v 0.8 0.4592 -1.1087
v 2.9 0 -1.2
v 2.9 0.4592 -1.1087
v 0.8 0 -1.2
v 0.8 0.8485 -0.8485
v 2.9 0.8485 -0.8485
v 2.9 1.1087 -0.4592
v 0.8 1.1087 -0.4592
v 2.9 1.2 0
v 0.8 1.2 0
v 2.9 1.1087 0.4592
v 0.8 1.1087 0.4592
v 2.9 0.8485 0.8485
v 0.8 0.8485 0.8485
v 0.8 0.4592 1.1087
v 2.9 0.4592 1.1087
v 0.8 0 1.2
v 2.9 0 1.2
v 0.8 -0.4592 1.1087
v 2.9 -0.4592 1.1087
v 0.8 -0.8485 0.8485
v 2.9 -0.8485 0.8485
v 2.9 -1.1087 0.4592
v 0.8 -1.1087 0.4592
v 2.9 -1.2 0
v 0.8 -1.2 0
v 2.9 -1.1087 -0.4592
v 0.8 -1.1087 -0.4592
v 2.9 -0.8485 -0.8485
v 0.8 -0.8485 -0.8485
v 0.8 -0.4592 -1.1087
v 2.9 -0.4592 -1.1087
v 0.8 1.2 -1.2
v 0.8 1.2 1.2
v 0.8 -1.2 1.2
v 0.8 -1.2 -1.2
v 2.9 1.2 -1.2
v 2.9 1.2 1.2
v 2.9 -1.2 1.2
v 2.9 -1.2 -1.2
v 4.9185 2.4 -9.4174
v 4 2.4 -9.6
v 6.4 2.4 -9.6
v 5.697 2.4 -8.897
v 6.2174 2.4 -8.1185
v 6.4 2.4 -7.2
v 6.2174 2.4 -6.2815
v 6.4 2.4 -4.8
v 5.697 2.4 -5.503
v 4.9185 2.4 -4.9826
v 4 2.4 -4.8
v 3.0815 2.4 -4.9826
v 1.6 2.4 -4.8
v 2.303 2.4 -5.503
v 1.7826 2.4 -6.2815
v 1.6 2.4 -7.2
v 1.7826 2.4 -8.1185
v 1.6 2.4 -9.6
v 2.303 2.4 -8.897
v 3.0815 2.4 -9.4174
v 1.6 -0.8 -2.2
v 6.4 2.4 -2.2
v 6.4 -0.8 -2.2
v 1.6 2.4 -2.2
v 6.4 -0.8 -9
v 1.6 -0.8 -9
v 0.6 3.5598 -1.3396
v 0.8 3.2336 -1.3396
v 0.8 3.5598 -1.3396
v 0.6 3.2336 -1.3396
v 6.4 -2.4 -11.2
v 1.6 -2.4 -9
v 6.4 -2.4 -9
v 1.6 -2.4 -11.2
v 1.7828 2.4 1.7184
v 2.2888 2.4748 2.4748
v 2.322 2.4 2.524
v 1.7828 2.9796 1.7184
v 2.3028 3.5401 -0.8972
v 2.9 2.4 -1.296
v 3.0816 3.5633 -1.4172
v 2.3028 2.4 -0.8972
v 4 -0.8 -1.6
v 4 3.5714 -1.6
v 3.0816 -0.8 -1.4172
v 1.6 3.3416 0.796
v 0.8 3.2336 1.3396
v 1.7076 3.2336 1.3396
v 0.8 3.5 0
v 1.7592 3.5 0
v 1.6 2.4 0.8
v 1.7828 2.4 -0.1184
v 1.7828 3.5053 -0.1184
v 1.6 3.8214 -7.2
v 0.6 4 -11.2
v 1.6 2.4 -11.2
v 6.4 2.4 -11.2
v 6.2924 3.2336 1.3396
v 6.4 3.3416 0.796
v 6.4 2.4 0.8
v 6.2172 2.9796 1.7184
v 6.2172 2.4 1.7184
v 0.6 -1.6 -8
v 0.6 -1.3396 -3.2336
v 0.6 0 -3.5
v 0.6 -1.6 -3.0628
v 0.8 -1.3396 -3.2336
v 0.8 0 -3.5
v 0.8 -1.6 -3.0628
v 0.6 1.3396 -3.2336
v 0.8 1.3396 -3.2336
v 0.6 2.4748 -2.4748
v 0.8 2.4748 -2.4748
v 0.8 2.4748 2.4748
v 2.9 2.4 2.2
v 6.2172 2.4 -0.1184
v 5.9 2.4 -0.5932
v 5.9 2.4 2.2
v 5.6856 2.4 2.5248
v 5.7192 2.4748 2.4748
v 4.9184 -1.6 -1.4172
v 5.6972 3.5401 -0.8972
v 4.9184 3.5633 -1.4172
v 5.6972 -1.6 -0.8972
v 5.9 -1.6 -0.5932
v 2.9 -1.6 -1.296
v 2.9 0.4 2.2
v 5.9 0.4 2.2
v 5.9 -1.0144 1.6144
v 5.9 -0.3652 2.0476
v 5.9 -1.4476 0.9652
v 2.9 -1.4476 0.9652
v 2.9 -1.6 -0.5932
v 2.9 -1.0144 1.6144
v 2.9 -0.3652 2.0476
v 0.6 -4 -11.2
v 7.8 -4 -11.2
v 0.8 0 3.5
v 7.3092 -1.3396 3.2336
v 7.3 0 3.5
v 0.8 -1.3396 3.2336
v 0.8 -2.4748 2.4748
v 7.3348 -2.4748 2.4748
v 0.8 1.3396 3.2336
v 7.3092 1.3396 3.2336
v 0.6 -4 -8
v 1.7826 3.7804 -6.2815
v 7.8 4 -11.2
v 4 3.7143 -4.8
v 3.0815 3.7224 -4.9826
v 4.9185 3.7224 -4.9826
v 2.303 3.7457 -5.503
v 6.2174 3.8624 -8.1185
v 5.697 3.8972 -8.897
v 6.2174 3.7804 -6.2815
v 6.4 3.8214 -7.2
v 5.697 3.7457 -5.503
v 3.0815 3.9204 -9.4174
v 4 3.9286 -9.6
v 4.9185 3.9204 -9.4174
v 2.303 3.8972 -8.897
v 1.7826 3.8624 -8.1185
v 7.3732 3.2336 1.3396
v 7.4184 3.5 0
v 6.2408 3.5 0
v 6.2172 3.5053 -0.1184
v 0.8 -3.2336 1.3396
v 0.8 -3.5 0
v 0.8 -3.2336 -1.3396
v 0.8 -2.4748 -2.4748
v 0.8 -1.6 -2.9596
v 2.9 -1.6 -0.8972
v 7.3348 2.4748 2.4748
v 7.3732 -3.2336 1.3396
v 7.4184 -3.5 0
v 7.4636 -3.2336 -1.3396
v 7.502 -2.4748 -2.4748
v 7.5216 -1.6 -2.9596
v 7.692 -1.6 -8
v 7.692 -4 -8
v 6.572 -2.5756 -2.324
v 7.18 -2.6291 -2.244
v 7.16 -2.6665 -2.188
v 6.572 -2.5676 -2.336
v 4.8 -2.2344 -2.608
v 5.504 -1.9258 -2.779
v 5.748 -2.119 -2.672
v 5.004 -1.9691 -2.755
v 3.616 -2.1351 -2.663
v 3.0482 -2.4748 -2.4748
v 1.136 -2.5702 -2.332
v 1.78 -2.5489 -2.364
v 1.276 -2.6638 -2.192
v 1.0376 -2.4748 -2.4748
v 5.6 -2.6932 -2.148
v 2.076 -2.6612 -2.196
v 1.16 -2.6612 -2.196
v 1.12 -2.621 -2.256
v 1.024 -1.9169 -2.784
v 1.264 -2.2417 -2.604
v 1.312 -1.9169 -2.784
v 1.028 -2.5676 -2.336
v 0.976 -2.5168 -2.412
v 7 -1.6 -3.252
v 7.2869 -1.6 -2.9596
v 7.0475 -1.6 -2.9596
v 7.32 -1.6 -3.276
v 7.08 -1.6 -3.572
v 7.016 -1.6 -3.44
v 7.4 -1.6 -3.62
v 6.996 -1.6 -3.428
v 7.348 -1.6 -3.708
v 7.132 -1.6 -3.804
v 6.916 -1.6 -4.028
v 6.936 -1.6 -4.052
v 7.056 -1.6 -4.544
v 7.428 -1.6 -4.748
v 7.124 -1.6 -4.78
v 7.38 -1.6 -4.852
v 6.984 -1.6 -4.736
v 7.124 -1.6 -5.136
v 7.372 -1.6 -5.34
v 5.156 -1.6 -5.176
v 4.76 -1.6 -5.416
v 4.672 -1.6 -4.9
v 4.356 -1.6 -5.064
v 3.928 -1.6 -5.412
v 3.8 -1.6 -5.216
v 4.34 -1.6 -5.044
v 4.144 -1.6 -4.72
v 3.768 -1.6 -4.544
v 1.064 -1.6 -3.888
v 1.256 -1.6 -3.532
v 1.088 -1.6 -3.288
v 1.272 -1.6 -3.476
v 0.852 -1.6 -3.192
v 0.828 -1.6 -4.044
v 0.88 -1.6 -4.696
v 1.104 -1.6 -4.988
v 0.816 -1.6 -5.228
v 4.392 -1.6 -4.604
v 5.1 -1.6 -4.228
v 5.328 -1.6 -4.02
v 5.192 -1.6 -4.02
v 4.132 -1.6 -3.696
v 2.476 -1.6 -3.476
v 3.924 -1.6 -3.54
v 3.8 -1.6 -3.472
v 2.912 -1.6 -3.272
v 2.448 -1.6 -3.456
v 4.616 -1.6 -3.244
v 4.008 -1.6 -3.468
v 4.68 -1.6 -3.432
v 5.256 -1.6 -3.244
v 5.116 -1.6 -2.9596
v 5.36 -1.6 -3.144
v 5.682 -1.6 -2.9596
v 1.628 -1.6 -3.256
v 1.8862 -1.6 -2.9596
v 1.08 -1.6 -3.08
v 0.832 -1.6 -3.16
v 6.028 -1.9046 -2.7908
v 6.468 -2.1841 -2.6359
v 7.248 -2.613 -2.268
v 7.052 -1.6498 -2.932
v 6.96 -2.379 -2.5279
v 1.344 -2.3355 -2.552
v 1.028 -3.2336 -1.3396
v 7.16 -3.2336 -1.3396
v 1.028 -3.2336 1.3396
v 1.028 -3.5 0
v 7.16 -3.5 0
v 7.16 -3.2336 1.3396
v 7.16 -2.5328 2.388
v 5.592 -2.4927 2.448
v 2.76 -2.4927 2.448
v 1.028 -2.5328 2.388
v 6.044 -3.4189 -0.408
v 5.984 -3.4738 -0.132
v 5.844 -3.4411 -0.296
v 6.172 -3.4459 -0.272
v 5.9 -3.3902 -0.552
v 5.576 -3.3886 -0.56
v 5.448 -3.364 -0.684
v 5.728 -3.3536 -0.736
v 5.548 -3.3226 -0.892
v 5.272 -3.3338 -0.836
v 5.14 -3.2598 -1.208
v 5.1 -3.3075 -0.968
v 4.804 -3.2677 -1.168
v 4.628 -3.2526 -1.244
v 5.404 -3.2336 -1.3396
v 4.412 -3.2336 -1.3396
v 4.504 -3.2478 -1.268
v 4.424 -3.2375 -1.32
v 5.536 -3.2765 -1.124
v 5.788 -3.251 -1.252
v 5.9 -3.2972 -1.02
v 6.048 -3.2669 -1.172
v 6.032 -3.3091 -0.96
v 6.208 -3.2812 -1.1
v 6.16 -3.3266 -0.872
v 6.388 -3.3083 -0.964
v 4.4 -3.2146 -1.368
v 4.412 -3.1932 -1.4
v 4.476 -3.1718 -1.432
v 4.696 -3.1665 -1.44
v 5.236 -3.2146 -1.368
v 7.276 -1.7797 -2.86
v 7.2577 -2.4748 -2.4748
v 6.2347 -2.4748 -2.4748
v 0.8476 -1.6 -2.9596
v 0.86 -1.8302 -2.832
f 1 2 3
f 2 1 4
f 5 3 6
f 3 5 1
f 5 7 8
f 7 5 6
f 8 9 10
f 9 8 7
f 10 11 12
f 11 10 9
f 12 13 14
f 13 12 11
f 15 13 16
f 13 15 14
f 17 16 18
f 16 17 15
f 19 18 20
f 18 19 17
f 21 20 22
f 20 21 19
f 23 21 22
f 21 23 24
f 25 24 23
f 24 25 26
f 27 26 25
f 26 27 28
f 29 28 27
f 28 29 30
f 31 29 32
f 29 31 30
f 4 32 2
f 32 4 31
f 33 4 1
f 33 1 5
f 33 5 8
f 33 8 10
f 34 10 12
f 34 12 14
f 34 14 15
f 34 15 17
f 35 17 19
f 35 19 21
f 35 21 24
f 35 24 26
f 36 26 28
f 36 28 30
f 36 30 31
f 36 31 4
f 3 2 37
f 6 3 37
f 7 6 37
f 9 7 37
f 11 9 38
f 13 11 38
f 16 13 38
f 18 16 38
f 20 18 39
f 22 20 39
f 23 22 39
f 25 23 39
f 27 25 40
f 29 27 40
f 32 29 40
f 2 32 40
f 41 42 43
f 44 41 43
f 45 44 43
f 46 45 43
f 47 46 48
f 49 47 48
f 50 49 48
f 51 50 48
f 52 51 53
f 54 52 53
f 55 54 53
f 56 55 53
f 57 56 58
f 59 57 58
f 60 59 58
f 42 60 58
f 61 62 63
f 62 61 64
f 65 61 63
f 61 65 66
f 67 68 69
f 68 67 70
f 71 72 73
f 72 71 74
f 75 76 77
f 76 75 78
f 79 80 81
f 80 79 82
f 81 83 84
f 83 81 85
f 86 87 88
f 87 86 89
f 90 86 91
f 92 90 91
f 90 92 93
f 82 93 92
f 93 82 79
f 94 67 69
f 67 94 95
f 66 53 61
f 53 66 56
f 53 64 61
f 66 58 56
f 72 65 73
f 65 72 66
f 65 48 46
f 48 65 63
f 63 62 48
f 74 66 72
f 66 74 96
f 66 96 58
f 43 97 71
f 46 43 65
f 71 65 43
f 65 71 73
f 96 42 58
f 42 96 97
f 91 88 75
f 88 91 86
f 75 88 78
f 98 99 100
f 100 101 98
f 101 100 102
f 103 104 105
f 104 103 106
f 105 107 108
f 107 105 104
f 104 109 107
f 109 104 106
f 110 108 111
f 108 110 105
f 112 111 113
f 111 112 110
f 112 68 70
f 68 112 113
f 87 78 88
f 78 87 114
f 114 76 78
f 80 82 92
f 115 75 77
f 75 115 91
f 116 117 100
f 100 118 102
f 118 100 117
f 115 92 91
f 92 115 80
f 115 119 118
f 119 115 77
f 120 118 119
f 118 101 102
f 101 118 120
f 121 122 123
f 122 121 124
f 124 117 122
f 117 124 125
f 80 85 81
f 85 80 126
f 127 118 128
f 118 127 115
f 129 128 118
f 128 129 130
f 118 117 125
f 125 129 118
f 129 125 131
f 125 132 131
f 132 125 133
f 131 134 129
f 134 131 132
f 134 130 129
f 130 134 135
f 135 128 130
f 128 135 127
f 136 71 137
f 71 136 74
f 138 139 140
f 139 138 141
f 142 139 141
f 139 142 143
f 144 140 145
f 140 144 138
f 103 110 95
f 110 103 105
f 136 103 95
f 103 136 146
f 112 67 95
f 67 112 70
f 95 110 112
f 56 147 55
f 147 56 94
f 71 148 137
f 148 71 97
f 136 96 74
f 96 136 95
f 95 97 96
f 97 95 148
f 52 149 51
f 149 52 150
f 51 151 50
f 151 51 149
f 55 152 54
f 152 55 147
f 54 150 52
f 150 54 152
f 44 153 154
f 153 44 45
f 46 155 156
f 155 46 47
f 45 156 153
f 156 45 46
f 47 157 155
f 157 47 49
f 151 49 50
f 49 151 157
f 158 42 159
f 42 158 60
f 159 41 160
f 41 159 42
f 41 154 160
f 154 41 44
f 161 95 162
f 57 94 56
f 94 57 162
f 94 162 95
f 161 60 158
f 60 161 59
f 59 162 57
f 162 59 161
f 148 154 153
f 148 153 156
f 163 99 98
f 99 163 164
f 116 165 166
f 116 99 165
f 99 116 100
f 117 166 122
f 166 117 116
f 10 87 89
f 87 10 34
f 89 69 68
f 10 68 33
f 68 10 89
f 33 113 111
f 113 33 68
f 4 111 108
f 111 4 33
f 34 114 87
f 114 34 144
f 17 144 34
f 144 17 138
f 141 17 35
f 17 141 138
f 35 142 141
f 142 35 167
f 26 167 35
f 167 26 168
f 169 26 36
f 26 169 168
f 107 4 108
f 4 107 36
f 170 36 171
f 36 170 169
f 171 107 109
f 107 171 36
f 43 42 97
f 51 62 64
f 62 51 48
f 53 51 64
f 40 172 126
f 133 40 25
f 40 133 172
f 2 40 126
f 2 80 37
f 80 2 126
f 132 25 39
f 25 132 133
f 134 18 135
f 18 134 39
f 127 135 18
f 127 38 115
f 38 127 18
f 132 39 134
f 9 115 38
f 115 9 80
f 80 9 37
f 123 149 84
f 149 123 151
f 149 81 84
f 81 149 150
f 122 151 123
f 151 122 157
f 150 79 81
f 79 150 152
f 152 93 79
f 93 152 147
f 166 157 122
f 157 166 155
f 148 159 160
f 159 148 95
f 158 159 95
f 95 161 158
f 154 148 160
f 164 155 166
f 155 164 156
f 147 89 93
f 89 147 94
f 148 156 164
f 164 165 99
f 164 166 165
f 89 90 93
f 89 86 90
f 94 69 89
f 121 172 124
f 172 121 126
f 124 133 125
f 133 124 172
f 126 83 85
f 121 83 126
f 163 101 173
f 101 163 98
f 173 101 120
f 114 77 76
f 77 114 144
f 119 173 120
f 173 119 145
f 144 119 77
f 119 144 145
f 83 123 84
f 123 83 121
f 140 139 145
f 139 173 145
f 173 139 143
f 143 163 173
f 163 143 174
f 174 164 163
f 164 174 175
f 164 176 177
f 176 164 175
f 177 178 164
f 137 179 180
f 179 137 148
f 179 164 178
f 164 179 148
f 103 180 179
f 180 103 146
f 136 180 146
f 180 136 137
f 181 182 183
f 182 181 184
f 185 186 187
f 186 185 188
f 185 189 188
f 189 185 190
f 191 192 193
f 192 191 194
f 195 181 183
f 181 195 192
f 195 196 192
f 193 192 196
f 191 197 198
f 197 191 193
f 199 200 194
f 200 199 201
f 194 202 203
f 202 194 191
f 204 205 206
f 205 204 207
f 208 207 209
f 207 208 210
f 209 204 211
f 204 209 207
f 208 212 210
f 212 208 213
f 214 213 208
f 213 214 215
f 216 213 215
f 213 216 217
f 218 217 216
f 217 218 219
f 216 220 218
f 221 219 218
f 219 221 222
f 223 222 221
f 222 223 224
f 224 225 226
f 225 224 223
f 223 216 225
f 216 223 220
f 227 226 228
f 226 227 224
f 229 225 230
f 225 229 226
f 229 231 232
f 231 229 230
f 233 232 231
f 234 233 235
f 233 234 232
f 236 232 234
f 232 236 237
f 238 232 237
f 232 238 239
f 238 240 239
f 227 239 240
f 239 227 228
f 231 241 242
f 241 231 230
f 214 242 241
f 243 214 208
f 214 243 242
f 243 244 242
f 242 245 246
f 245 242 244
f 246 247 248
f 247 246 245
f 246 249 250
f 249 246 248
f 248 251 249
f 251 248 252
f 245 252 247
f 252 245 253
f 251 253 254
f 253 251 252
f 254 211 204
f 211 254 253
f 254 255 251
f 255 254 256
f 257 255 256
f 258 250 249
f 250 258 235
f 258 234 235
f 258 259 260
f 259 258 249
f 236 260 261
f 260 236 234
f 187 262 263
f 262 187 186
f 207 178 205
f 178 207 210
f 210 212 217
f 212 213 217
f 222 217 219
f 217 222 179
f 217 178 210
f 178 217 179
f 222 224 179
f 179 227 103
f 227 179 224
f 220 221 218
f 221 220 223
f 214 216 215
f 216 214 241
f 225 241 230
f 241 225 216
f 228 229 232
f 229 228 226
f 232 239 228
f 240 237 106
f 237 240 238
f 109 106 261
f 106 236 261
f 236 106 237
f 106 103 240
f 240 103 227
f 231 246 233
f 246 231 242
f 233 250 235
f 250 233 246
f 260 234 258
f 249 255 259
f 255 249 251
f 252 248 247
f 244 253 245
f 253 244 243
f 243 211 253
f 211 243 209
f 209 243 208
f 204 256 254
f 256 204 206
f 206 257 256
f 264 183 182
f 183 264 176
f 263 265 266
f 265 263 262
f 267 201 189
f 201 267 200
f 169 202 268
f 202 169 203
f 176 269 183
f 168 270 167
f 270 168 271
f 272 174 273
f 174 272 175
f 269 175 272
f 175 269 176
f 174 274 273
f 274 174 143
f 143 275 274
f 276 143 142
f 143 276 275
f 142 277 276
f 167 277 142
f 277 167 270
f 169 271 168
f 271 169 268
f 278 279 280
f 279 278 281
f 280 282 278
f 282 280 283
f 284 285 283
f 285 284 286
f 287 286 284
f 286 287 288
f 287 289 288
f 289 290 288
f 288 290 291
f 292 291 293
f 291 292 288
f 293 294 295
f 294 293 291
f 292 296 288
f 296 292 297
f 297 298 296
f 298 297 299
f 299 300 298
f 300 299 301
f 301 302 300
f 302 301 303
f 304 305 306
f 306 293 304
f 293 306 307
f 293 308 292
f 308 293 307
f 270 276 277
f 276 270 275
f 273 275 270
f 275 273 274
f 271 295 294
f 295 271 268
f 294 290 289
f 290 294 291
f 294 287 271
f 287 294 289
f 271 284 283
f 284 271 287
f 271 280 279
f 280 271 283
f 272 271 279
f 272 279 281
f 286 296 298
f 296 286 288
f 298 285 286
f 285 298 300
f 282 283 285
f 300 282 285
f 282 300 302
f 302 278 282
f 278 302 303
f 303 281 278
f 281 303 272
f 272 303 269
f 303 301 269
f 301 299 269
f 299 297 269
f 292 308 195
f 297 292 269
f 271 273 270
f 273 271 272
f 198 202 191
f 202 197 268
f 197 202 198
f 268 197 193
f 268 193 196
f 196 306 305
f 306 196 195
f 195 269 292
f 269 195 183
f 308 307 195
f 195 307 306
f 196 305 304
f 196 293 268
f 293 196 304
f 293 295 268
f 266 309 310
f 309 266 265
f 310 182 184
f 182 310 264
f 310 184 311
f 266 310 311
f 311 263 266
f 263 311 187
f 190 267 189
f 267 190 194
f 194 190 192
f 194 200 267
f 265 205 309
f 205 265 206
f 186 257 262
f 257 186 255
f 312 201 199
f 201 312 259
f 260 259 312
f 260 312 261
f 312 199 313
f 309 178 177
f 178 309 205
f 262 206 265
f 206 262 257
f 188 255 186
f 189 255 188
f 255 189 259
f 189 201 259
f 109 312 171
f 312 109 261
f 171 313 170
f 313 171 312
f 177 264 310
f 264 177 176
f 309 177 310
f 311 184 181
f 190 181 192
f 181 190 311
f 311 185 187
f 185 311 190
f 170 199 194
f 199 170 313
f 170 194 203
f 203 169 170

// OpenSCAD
use <../lib.scad>
use <s/3817bs01.scad>
function ldraw_lib__3817bps0() = [
// 0 ~Minifig Leg Left with SW White Leggings Pattern (Obsolete)
// 0 Name: 3817bps0.dat
// 0 Author: Magnus Forsberg [MagFors]
// 0 !LDRAW_ORG Part UPDATE 2023-03
// 0 !LICENSE Licensed under CC BY 4.0 : see CAreadme.txt
// 
// 0 BFC CERTIFY CCW
  [0,"BFC","CERTIFY"],
  [0,"BFC","CCW"],
// 
// 0 !KEYWORDS 1999, Bricklink 970c02pb03, Luke Skywalker, set 4501, set 7110
// 0 !KEYWORDS set 7190, Tatooine
// 
// 0 !CMDLINE -c19
// 
// 0 !HISTORY 2012-03-30 [TK-949] Original design as 3817ps0
// 0 !HISTORY 2020-06-24 [MagFors] Adapted to corrected geometry
// 0 !HISTORY 2020-12-29 [PTadmin] Official Update 2020-03
// 0 !HISTORY 2023-05-21 [MagFors] Obsoleted due to bad geomatery
// 0 !HISTORY 2023-06-24 [OrionP] Official Update 2023-03
// 
// 
// 1 16 0 0 0 1 0 0 0 1 0 0 0 1 s\3817bs01.dat
  [1,16,0,0,0,1,0,0,0,1,0,0,0,1, ldraw_lib__s__3817bs01()],
// 4 16 1.5 20 -4 1.5 20 -10 19.23 20 -10 19.23 20 -4
  [4,16,1.5,20,-4,1.5,20,-10,19.23,20,-10,19.23,20,-4],
// 4 16 1.5 28 -10 19.5 28 -10 19.23 20 -10 1.5 20 -10
  [4,16,1.5,28,-10,19.5,28,-10,19.23,20,-10,1.5,20,-10],
// 5 24 2 3.349 -8.084 18.659 3.349 -8.084 2 0 -8.75 2 6.187 -6.187
  [5,24,2,3.349,-8.084,18.659,3.349,-8.084,2,0,-8.75,2,6.187,-6.187],
// 5 24 2 6.187 -6.187 18.755 6.187 -6.187 2 7.399 -4 2 3.349 -8.084
  [5,24,2,6.187,-6.187,18.755,6.187,-6.187,2,7.399,-4,2,3.349,-8.084],
// 5 24 2 0 -8.75 18.546 0 -8.75 2 3.349 -8.084 2 -3.349 -8.084
  [5,24,2,0,-8.75,18.546,0,-8.75,2,3.349,-8.084,2,-3.349,-8.084],
// 5 24 2 -3.349 -8.084 18.433 -3.349 -8.084 2 0 -8.75 2 -6.187 -6.187
  [5,24,2,-3.349,-8.084,18.433,-3.349,-8.084,2,0,-8.75,2,-6.187,-6.187],
// 
// 4 0 16.43 5.81 -6.439 16.43 5.84 -6.4189 17.95 5.61 -6.5727 17.9 5.47 -6.6663
  [4,0,16.43,5.81,-6.439,16.43,5.84,-6.4189,17.95,5.61,-6.5727,17.9,5.47,-6.6663],
// 4 0 13.76 6.9476 -4.8145 14.37 6.68 -5.2974 12 6.52 -5.5861 12.51 6.8876 -4.9228
  [4,0,13.76,6.9476,-4.8145,14.37,6.68,-5.2974,12,6.52,-5.5861,12.51,6.8876,-4.9228],
// 4 0 7.6205 6.187 -6.187 9.04 6.6576 -5.3378 12.51 6.8876 -4.9228 12 6.52 -5.5861
  [4,0,7.6205,6.187,-6.187,9.04,6.6576,-5.3378,12.51,6.8876,-4.9228,12,6.52,-5.5861],
// 4 0 3.19 5.48 -6.6596 2.84 5.83 -6.4256 2.5939 6.187 -6.187 4.45 5.91 -6.3722
  [4,0,3.19,5.48,-6.6596,2.84,5.83,-6.4256,2.5939,6.187,-6.187,4.45,5.91,-6.3722],
// 4 0 16.43 5.81 -6.439 17.9 5.47 -6.6663 14 5.37 -6.7331 4.45 5.91 -6.3722
  [4,0,16.43,5.81,-6.439,17.9,5.47,-6.6663,14,5.37,-6.7331,4.45,5.91,-6.3722],
// 3 0 14 5.37 -6.7331 5.19 5.49 -6.6529 4.45 5.91 -6.3722
  [3,0,14,5.37,-6.7331,5.19,5.49,-6.6529,4.45,5.91,-6.3722],
// 3 0 3.19 5.48 -6.6596 4.45 5.91 -6.3722 5.19 5.49 -6.6529
  [3,0,3.19,5.48,-6.6596,4.45,5.91,-6.3722,5.19,5.49,-6.6529],
// 4 0 2.8 5.64 -6.5526 2.84 5.83 -6.4256 3.19 5.48 -6.6596 2.9 5.49 -6.6529
  [4,0,2.8,5.64,-6.5526,2.84,5.83,-6.4256,3.19,5.48,-6.6596,2.9,5.49,-6.6529],
// 4 0 3.28 6.96 -4.7922 3.16 6.51 -5.6042 2.5939 6.187 -6.187 2.56 6.96 -4.7922
  [4,0,3.28,6.96,-4.7922,3.16,6.51,-5.6042,2.5939,6.187,-6.187,2.56,6.96,-4.7922],
// 4 0 2.5939 6.187 -6.187 2.84 5.83 -6.4256 2.57 5.84 -6.4189 2.44 6.03 -6.2919
  [4,0,2.5939,6.187,-6.187,2.84,5.83,-6.4256,2.57,5.84,-6.4189,2.44,6.03,-6.2919],
// 4 0 18.3 8.19 -4 18.2172 7.399 -4 17.6188 7.399 -4 17.5 8.13 -4
  [4,0,18.3,8.19,-4,18.2172,7.399,-4,17.6188,7.399,-4,17.5,8.13,-4],
// 4 0 17.7 8.93 -4 18.5 9.05 -4 18.3 8.19 -4 17.54 8.6 -4
  [4,0,17.7,8.93,-4,18.5,9.05,-4,18.3,8.19,-4,17.54,8.6,-4],
// 4 0 17.49 8.57 -4 17.54 8.6 -4 18.3 8.19 -4 17.5 8.13 -4
  [4,0,17.49,8.57,-4,17.54,8.6,-4,18.3,8.19,-4,17.5,8.13,-4],
// 4 0 18.37 9.27 -4 18.5 9.05 -4 17.7 8.93 -4 17.83 9.51 -4
  [4,0,18.37,9.27,-4,18.5,9.05,-4,17.7,8.93,-4,17.83,9.51,-4],
// 4 0 17.83 9.51 -4 17.7 8.93 -4 17.29 10.07 -4 17.34 10.13 -4
  [4,0,17.83,9.51,-4,17.7,8.93,-4,17.29,10.07,-4,17.34,10.13,-4],
// 4 0 17.83 9.51 -4 17.34 10.13 -4 17.64 11.36 -4 18.57 11.87 -4
  [4,0,17.83,9.51,-4,17.34,10.13,-4,17.64,11.36,-4,18.57,11.87,-4],
// 4 0 18.45 12.13 -4 18.57 11.87 -4 17.64 11.36 -4 17.81 11.95 -4
  [4,0,18.45,12.13,-4,18.57,11.87,-4,17.64,11.36,-4,17.81,11.95,-4],
// 3 0 17.64 11.36 -4 17.46 11.84 -4 17.81 11.95 -4
  [3,0,17.64,11.36,-4,17.46,11.84,-4,17.81,11.95,-4],
// 4 0 18.45 12.13 -4 17.81 11.95 -4 17.81 12.84 -4 18.43 13.35 -4
  [4,0,18.45,12.13,-4,17.81,11.95,-4,17.81,12.84,-4,18.43,13.35,-4],
// 4 0 18.43 13.35 -4 17.81 12.84 -4 12.89 12.94 -4 11.9 13.54 -4
  [4,0,18.43,13.35,-4,17.81,12.84,-4,12.89,12.94,-4,11.9,13.54,-4],
// 4 0 11.9 13.54 -4 12.89 12.94 -4 11.68 12.25 -4 10.89 12.66 -4
  [4,0,11.9,13.54,-4,12.89,12.94,-4,11.68,12.25,-4,10.89,12.66,-4],
// 4 0 11.68 12.25 -4 12.89 12.94 -4 17.46 11.84 -4 17.64 11.36 -4
  [4,0,11.68,12.25,-4,12.89,12.94,-4,17.46,11.84,-4,17.64,11.36,-4],
// 4 0 9.82 13.53 -4 11.9 13.54 -4 10.89 12.66 -4 9.5 13.04 -4
  [4,0,9.82,13.53,-4,11.9,13.54,-4,10.89,12.66,-4,9.5,13.04,-4],
// 4 0 10.85 12.61 -4 10.89 12.66 -4 11.68 12.25 -4 10.36 11.8 -4
  [4,0,10.85,12.61,-4,10.89,12.66,-4,11.68,12.25,-4,10.36,11.8,-4],
// 4 0 10.85 12.61 -4 10.36 11.8 -4 9.42 11.36 -4 2.66 9.72 -4
  [4,0,10.85,12.61,-4,10.36,11.8,-4,9.42,11.36,-4,2.66,9.72,-4],
// 3 0 3.14 8.83 -4 2.66 9.72 -4 9.42 11.36 -4
  [3,0,3.14,8.83,-4,2.66,9.72,-4,9.42,11.36,-4],
// 4 0 3.14 8.83 -4 3.18 8.69 -4 2.72 8.22 -4 2.66 9.72 -4
  [4,0,3.14,8.83,-4,3.18,8.69,-4,2.72,8.22,-4,2.66,9.72,-4],
// 4 0 2.66 9.72 -4 2.72 8.22 -4 2.13 7.98 -4 2.07 10.11 -4
  [4,0,2.66,9.72,-4,2.72,8.22,-4,2.13,7.98,-4,2.07,10.11,-4],
// 4 0 2.76 12.47 -4 2.66 9.72 -4 2.07 10.11 -4 2.2 11.74 -4
  [4,0,2.76,12.47,-4,2.66,9.72,-4,2.07,10.11,-4,2.2,11.74,-4],
// 3 0 2.2 11.74 -4 2.04 13.07 -4 2.76 12.47 -4
  [3,0,2.2,11.74,-4,2.04,13.07,-4,2.76,12.47,-4],
// 4 0 2.76 12.47 -4 2.04 13.07 -4 9.82 13.53 -4 9.5 13.04 -4
  [4,0,2.76,12.47,-4,2.04,13.07,-4,9.82,13.53,-4,9.5,13.04,-4],
// 4 0 9.42 11.36 -4 10.36 11.8 -4 10.98 11.51 -4 12.75 10.57 -4
  [4,0,9.42,11.36,-4,10.36,11.8,-4,10.98,11.51,-4,12.75,10.57,-4],
// 3 0 17.29 10.07 -4 12.75 10.57 -4 10.98 11.51 -4
  [3,0,17.29,10.07,-4,12.75,10.57,-4,10.98,11.51,-4],
// 4 0 17.29 10.07 -4 17.7 8.93 -4 13.32 10.05 -4 12.75 10.57 -4
  [4,0,17.29,10.07,-4,17.7,8.93,-4,13.32,10.05,-4,12.75,10.57,-4],
// 3 0 13.32 10.05 -4 12.98 10.05 -4 12.75 10.57 -4
  [3,0,13.32,10.05,-4,12.98,10.05,-4,12.75,10.57,-4],
// 4 0 12.75 10.57 -4 12.98 10.05 -4 10.33 9.24 -4 6.19 8.69 -4
  [4,0,12.75,10.57,-4,12.98,10.05,-4,10.33,9.24,-4,6.19,8.69,-4],
// 4 0 6.19 8.69 -4 10.33 9.24 -4 9.81 8.85 -4 9.5 8.68 -4
  [4,0,6.19,8.69,-4,10.33,9.24,-4,9.81,8.85,-4,9.5,8.68,-4],
// 4 0 6.19 8.69 -4 9.5 8.68 -4 7.28 8.18 -4 6.12 8.64 -4
  [4,0,6.19,8.69,-4,9.5,8.68,-4,7.28,8.18,-4,6.12,8.64,-4],
// 4 0 7.28 8.18 -4 9.5 8.68 -4 10.02 8.67 -4 11.54 8.11 -4
  [4,0,7.28,8.18,-4,9.5,8.68,-4,10.02,8.67,-4,11.54,8.11,-4],
// 4 0 10.02 8.67 -4 9.81 8.85 -4 10.33 9.24 -4 11.7 8.58 -4
  [4,0,10.02,8.67,-4,9.81,8.85,-4,10.33,9.24,-4,11.7,8.58,-4],
// 4 0 11.54 8.11 -4 10.02 8.67 -4 11.7 8.58 -4 13.14 8.11 -4
  [4,0,11.54,8.11,-4,10.02,8.67,-4,11.7,8.58,-4,13.14,8.11,-4],
// 4 0 13.14 8.11 -4 11.7 8.58 -4 17.49 8.57 -4 17.5 8.13 -4
  [4,0,13.14,8.11,-4,11.7,8.58,-4,17.49,8.57,-4,17.5,8.13,-4],
// 4 0 11.54 8.11 -4 13.14 8.11 -4 13.4 7.86 -4 12.7901 7.399 -4
  [4,0,11.54,8.11,-4,13.14,8.11,-4,13.4,7.86,-4,12.7901,7.399,-4],
// 3 0 14.2051 7.399 -4 12.7901 7.399 -4 13.4 7.86 -4
  [3,0,14.2051,7.399,-4,12.7901,7.399,-4,13.4,7.86,-4],
// 4 0 3.18 8.69 -4 6.12 8.64 -4 7.28 8.18 -4 4.07 8.14 -4
  [4,0,3.18,8.69,-4,6.12,8.64,-4,7.28,8.18,-4,4.07,8.14,-4],
// 3 0 4.07 8.14 -4 2.72 8.22 -4 3.18 8.69 -4
  [3,0,4.07,8.14,-4,2.72,8.22,-4,3.18,8.69,-4],
// 4 0 4.07 8.14 -4 7.28 8.18 -4 4.7156 7.399 -4 2.7 7.7 -4
  [4,0,4.07,8.14,-4,7.28,8.18,-4,4.7156,7.399,-4,2.7,7.7,-4],
// 4 0 2.7 7.7 -4 2.08 7.9 -4 2.13 7.98 -4 2.72 8.22 -4
  [4,0,2.7,7.7,-4,2.08,7.9,-4,2.13,7.98,-4,2.72,8.22,-4],
// 4 0 14.37 6.68 -5.2974 13.76 6.9476 -4.8145 15.07 6.977 -4.7615 16.17 6.5897 -5.4603
  [4,0,14.37,6.68,-5.2974,13.76,6.9476,-4.8145,15.07,6.977,-4.7615,16.17,6.5897,-5.4603],
// 4 16 18.804 7.399 -4 18.2172 7.399 -4 18.3 8.19 -4 18.5 9.05 -4
  [4,16,18.804,7.399,-4,18.2172,7.399,-4,18.3,8.19,-4,18.5,9.05,-4],
// 3 16 18.5 9.05 -4 18.37 9.27 -4 18.57 11.87 -4
  [3,16,18.5,9.05,-4,18.37,9.27,-4,18.57,11.87,-4],
// 3 16 18.37 9.27 -4 17.83 9.51 -4 18.57 11.87 -4
  [3,16,18.37,9.27,-4,17.83,9.51,-4,18.57,11.87,-4],
// 4 16 18.57 11.87 -4 18.45 12.13 -4 18.43 13.35 -4 19.23 20 -4
  [4,16,18.57,11.87,-4,18.45,12.13,-4,18.43,13.35,-4,19.23,20,-4],
// 4 16 18.804 7.399 -4 18.5 9.05 -4 18.57 11.87 -4 19.23 20 -4
  [4,16,18.804,7.399,-4,18.5,9.05,-4,18.57,11.87,-4,19.23,20,-4],
// 3 16 18.43 13.35 -4 11.9 13.54 -4 19.23 20 -4
  [3,16,18.43,13.35,-4,11.9,13.54,-4,19.23,20,-4],
// 4 16 19.23 20 -4 11.9 13.54 -4 9.82 13.53 -4 1.5 20 -4
  [4,16,19.23,20,-4,11.9,13.54,-4,9.82,13.53,-4,1.5,20,-4],
// 4 16 17.81 12.84 -4 17.81 11.95 -4 17.46 11.84 -4 12.89 12.94 -4
  [4,16,17.81,12.84,-4,17.81,11.95,-4,17.46,11.84,-4,12.89,12.94,-4],
// 4 16 17.64 11.36 -4 17.34 10.13 -4 17.29 10.07 -4 10.98 11.51 -4
  [4,16,17.64,11.36,-4,17.34,10.13,-4,17.29,10.07,-4,10.98,11.51,-4],
// 4 16 11.68 12.25 -4 17.64 11.36 -4 10.98 11.51 -4 10.36 11.8 -4
  [4,16,11.68,12.25,-4,17.64,11.36,-4,10.98,11.51,-4,10.36,11.8,-4],
// 4 16 9.5 13.04 -4 10.89 12.66 -4 10.85 12.61 -4 2.66 9.72 -4
  [4,16,9.5,13.04,-4,10.89,12.66,-4,10.85,12.61,-4,2.66,9.72,-4],
// 3 16 2.66 9.72 -4 2.76 12.47 -4 9.5 13.04 -4
  [3,16,2.66,9.72,-4,2.76,12.47,-4,9.5,13.04,-4],
// 4 16 2.04 13.07 -4 2.2 11.74 -4 2.07 10.11 -4 1.5 7.657 -4
  [4,16,2.04,13.07,-4,2.2,11.74,-4,2.07,10.11,-4,1.5,7.657,-4],
// 3 16 2 7.657 -4 1.5 7.657 -4 2.08 7.9 -4
  [3,16,2,7.657,-4,1.5,7.657,-4,2.08,7.9,-4],
// 4 16 2.13 7.98 -4 2.08 7.9 -4 1.5 7.657 -4 2.07 10.11 -4
  [4,16,2.13,7.98,-4,2.08,7.9,-4,1.5,7.657,-4,2.07,10.11,-4],
// 3 16 1.5 7.657 -4 1.5 20 -4 2.04 13.07 -4
  [3,16,1.5,7.657,-4,1.5,20,-4,2.04,13.07,-4],
// 3 16 2.04 13.07 -4 1.5 20 -4 9.82 13.53 -4
  [3,16,2.04,13.07,-4,1.5,20,-4,9.82,13.53,-4],
// 4 16 9.42 11.36 -4 12.75 10.57 -4 6.19 8.69 -4 3.14 8.83 -4
  [4,16,9.42,11.36,-4,12.75,10.57,-4,6.19,8.69,-4,3.14,8.83,-4],
// 4 16 6.19 8.69 -4 6.12 8.64 -4 3.18 8.69 -4 3.14 8.83 -4
  [4,16,6.19,8.69,-4,6.12,8.64,-4,3.18,8.69,-4,3.14,8.83,-4],
// 3 16 2.7 7.7 -4 2.72 8.22 -4 4.07 8.14 -4
  [3,16,2.7,7.7,-4,2.72,8.22,-4,4.07,8.14,-4],
// 4 16 12.7901 7.399 -4 4.7156 7.399 -4 7.28 8.18 -4 11.54 8.11 -4
  [4,16,12.7901,7.399,-4,4.7156,7.399,-4,7.28,8.18,-4,11.54,8.11,-4],
// 3 16 10.02 8.67 -4 9.5 8.68 -4 9.81 8.85 -4
  [3,16,10.02,8.67,-4,9.5,8.68,-4,9.81,8.85,-4],
// 4 16 11.7 8.58 -4 10.33 9.24 -4 12.98 10.05 -4 13.32 10.05 -4
  [4,16,11.7,8.58,-4,10.33,9.24,-4,12.98,10.05,-4,13.32,10.05,-4],
// 4 16 17.49 8.57 -4 11.7 8.58 -4 13.32 10.05 -4 17.54 8.6 -4
  [4,16,17.49,8.57,-4,11.7,8.58,-4,13.32,10.05,-4,17.54,8.6,-4],
// 3 16 17.54 8.6 -4 13.32 10.05 -4 17.7 8.93 -4
  [3,16,17.54,8.6,-4,13.32,10.05,-4,17.7,8.93,-4],
// 4 16 13.14 8.11 -4 17.5 8.13 -4 17.6188 7.399 -4 13.4 7.86 -4
  [4,16,13.14,8.11,-4,17.5,8.13,-4,17.6188,7.399,-4,13.4,7.86,-4],
// 3 16 17.6188 7.399 -4 14.2051 7.399 -4 13.4 7.86 -4
  [3,16,17.6188,7.399,-4,14.2051,7.399,-4,13.4,7.86,-4],
// 4 16 17.9 5.47 -6.6663 17.95 5.61 -6.5727 18.12 5.67 -6.5326 18.659 3.349 -8.084
  [4,16,17.9,5.47,-6.6663,17.95,5.61,-6.5727,18.12,5.67,-6.5326,18.659,3.349,-8.084],
// 4 16 15.07 6.977 -4.7615 17.63 7.33 -4.1245 17.4 6.3197 -5.9475 16.17 6.5897 -5.4603
  [4,16,15.07,6.977,-4.7615,17.63,7.33,-4.1245,17.4,6.3197,-5.9475,16.17,6.5897,-5.4603],
// 4 16 3.36 6.38 -5.8387 3.16 6.51 -5.6042 3.28 6.96 -4.7922 9.04 6.6576 -5.3378
  [4,16,3.36,6.38,-5.8387,3.16,6.51,-5.6042,3.28,6.96,-4.7922,9.04,6.6576,-5.3378],
// 4 16 2 3.349 -8.084 2.44 6.03 -6.2919 2.57 5.84 -6.4189 2.57 3.349 -8.084
  [4,16,2,3.349,-8.084,2.44,6.03,-6.2919,2.57,5.84,-6.4189,2.57,3.349,-8.084],
// 3 16 18.659 3.349 -8.084 17.9 3.349 -8.084 17.9 5.47 -6.6663
  [3,16,18.659,3.349,-8.084,17.9,3.349,-8.084,17.9,5.47,-6.6663],
// 4 16 2 0 -8.75 2.57 0 -8.75 2.57 -3.349 -8.084 2 -3.349 -8.084
  [4,16,2,0,-8.75,2.57,0,-8.75,2.57,-3.349,-8.084,2,-3.349,-8.084],
// 4 16 17.9 0 -8.75 18.546 0 -8.75 18.433 -3.349 -8.084 17.9 -3.349 -8.084
  [4,16,17.9,0,-8.75,18.546,0,-8.75,18.433,-3.349,-8.084,17.9,-3.349,-8.084],
// 4 16 17.9 3.349 -8.084 18.659 3.349 -8.084 18.546 0 -8.75 17.9 0 -8.75
  [4,16,17.9,3.349,-8.084,18.659,3.349,-8.084,18.546,0,-8.75,17.9,0,-8.75],
// 4 16 17.9 -5.97 -6.332 17.9 -3.349 -8.084 18.433 -3.349 -8.084 18.337 -6.187 -6.187
  [4,16,17.9,-5.97,-6.332,17.9,-3.349,-8.084,18.433,-3.349,-8.084,18.337,-6.187,-6.187],
// 3 16 18.337 -6.187 -6.187 13.98 -6.12 -6.2318 17.9 -5.97 -6.332
  [3,16,18.337,-6.187,-6.187,13.98,-6.12,-6.2318,17.9,-5.97,-6.332],
// 4 16 6.9 -6.12 -6.2318 13.98 -6.12 -6.2318 18.337 -6.187 -6.187 2 -6.187 -6.187
  [4,16,6.9,-6.12,-6.2318,13.98,-6.12,-6.2318,18.337,-6.187,-6.187,2,-6.187,-6.187],
// 3 16 2 -6.187 -6.187 2.57 -5.97 -6.332 6.9 -6.12 -6.2318
  [3,16,2,-6.187,-6.187,2.57,-5.97,-6.332,6.9,-6.12,-6.2318],
// 4 16 2.57 -3.349 -8.084 2.57 -5.97 -6.332 2 -6.187 -6.187 2 -3.349 -8.084
  [4,16,2.57,-3.349,-8.084,2.57,-5.97,-6.332,2,-6.187,-6.187,2,-3.349,-8.084],
// 4 16 2 3.349 -8.084 2.57 3.349 -8.084 2.57 0 -8.75 2 0 -8.75
  [4,16,2,3.349,-8.084,2.57,3.349,-8.084,2.57,0,-8.75,2,0,-8.75],
// 4 7 15.43 .68 -8.6148 14.96 .33 -8.6844 14.61 .74 -8.6028 15.11 1.02 -8.5472
  [4,7,15.43,.68,-8.6148,14.96,.33,-8.6844,14.61,.74,-8.6028,15.11,1.02,-8.5472],
// 4 7 14.75 1.38 -8.4756 15.11 1.02 -8.5472 14.61 .74 -8.6028 13.94 1.4 -8.4716
  [4,7,14.75,1.38,-8.4756,15.11,1.02,-8.5472,14.61,.74,-8.6028,13.94,1.4,-8.4716],
// 4 7 13.94 1.4 -8.4716 13.62 1.71 -8.4099 13.87 2.23 -8.3065 14.32 1.84 -8.3841
  [4,7,13.94,1.4,-8.4716,13.62,1.71,-8.4099,13.87,2.23,-8.3065,14.32,1.84,-8.3841],
// 4 7 13.87 2.23 -8.3065 13.62 1.71 -8.4099 13.18 2.09 -8.3344 12.85 3.02 -8.1494
  [4,7,13.87,2.23,-8.3065,13.62,1.71,-8.4099,13.18,2.09,-8.3344,12.85,3.02,-8.1494],
// 3 7 13.18 2.09 -8.3344 12.75 2.42 -8.2687 12.85 3.02 -8.1494
  [3,7,13.18,2.09,-8.3344,12.75,2.42,-8.2687,12.85,3.02,-8.1494],
// 3 7 12.75 2.42 -8.2687 12.01 2.92 -8.1693 12.85 3.02 -8.1494
  [3,7,12.75,2.42,-8.2687,12.01,2.92,-8.1693,12.85,3.02,-8.1494],
// 3 7 12.85 3.02 -8.1494 12.01 2.92 -8.1693 11.57 3.11 -8.1315
  [3,7,12.85,3.02,-8.1494,12.01,2.92,-8.1693,11.57,3.11,-8.1315],
// 4 7 13.51 3.349 -8.084 12.85 3.02 -8.1494 11.57 3.11 -8.1315 11.03 3.349 -8.084
  [4,7,13.51,3.349,-8.084,12.85,3.02,-8.1494,11.57,3.11,-8.1315,11.03,3.349,-8.084],
// 4 7 11.06 3.3 -8.0937 11.03 3.349 -8.084 11.57 3.11 -8.1315 11.26 3.17 -8.1196
  [4,7,11.06,3.3,-8.0937,11.03,3.349,-8.084,11.57,3.11,-8.1315,11.26,3.17,-8.1196],
// 4 7 13.84 2.81 -8.1912 12.85 3.02 -8.1494 13.51 3.349 -8.084 14.47 3.13 -8.1276
  [4,7,13.84,2.81,-8.1912,12.85,3.02,-8.1494,13.51,3.349,-8.084,14.47,3.13,-8.1276],
// 4 7 14.75 2.55 -8.2429 13.84 2.81 -8.1912 14.47 3.13 -8.1276 15.12 2.93 -8.1673
  [4,7,14.75,2.55,-8.2429,13.84,2.81,-8.1912,14.47,3.13,-8.1276,15.12,2.93,-8.1673],
// 4 7 15.08 2.4 -8.2727 14.75 2.55 -8.2429 15.12 2.93 -8.1673 15.52 2.75 -8.2031
  [4,7,15.08,2.4,-8.2727,14.75,2.55,-8.2429,15.12,2.93,-8.1673,15.52,2.75,-8.2031],
// 4 7 15.4 2.18 -8.3165 15.08 2.4 -8.2727 15.52 2.75 -8.2031 15.97 2.41 -8.2707
  [4,7,15.4,2.18,-8.3165,15.08,2.4,-8.2727,15.52,2.75,-8.2031,15.97,2.41,-8.2707],
// 3 7 11 3.42 -8.0365 11.03 3.5 -7.9831 11.19 3.58 -7.9296
  [3,7,11,3.42,-8.0365,11.03,3.5,-7.9831,11.19,3.58,-7.9296],
// 4 7 11.03 3.349 -8.084 11 3.42 -8.0365 11.19 3.58 -7.9296 11.74 3.6 -7.9162
  [4,7,11.03,3.349,-8.084,11,3.42,-8.0365,11.19,3.58,-7.9296,11.74,3.6,-7.9162],
// 4 7 13.51 3.349 -8.084 11.03 3.349 -8.084 11.74 3.6 -7.9162 13.09 3.42 -8.0365
  [4,7,13.51,3.349,-8.084,11.03,3.349,-8.084,11.74,3.6,-7.9162,13.09,3.42,-8.0365],
// 4 15 6.9 -6.12 -6.2318 2.57 -5.97 -6.332 2.57 -3.349 -8.084 13.98 -6.12 -6.2318
  [4,15,6.9,-6.12,-6.2318,2.57,-5.97,-6.332,2.57,-3.349,-8.084,13.98,-6.12,-6.2318],
// 4 15 2.57 -3.349 -8.084 17.9 -3.349 -8.084 17.9 -5.97 -6.332 13.98 -6.12 -6.2318
  [4,15,2.57,-3.349,-8.084,17.9,-3.349,-8.084,17.9,-5.97,-6.332,13.98,-6.12,-6.2318],
// 4 15 11.06 3.3 -8.0937 11.26 3.17 -8.1196 2.57 0 -8.75 2.57 3.349 -8.084
  [4,15,11.06,3.3,-8.0937,11.26,3.17,-8.1196,2.57,0,-8.75,2.57,3.349,-8.084],
// 4 15 11.26 3.17 -8.1196 11.57 3.11 -8.1315 12.01 2.92 -8.1693 12.75 2.42 -8.2687
  [4,15,11.26,3.17,-8.1196,11.57,3.11,-8.1315,12.01,2.92,-8.1693,12.75,2.42,-8.2687],
// 4 15 11.26 3.17 -8.1196 12.75 2.42 -8.2687 13.18 2.09 -8.3344 2.57 0 -8.75
  [4,15,11.26,3.17,-8.1196,12.75,2.42,-8.2687,13.18,2.09,-8.3344,2.57,0,-8.75],
// 4 15 2.57 0 -8.75 13.18 2.09 -8.3344 13.62 1.71 -8.4099 13.94 1.4 -8.4716
  [4,15,2.57,0,-8.75,13.18,2.09,-8.3344,13.62,1.71,-8.4099,13.94,1.4,-8.4716],
// 4 15 2.57 0 -8.75 13.94 1.4 -8.4716 14.61 .74 -8.6028 14.96 .33 -8.6844
  [4,15,2.57,0,-8.75,13.94,1.4,-8.4716,14.61,.74,-8.6028,14.96,.33,-8.6844],
// 3 15 17.9 0 -8.75 2.57 0 -8.75 14.96 .33 -8.6844
  [3,15,17.9,0,-8.75,2.57,0,-8.75,14.96,.33,-8.6844],
// 3 15 17.9 0 -8.75 14.96 .33 -8.6844 15.43 .68 -8.6148
  [3,15,17.9,0,-8.75,14.96,.33,-8.6844,15.43,.68,-8.6148],
// 4 15 13.87 2.23 -8.3065 12.85 3.02 -8.1494 13.84 2.81 -8.1912 14.75 2.55 -8.2429
  [4,15,13.87,2.23,-8.3065,12.85,3.02,-8.1494,13.84,2.81,-8.1912,14.75,2.55,-8.2429],
// 4 15 14.32 1.84 -8.3841 13.87 2.23 -8.3065 14.75 2.55 -8.2429 15.08 2.4 -8.2727
  [4,15,14.32,1.84,-8.3841,13.87,2.23,-8.3065,14.75,2.55,-8.2429,15.08,2.4,-8.2727],
// 3 7 14.75 1.38 -8.4756 13.94 1.4 -8.4716 14.32 1.84 -8.3841
  [3,7,14.75,1.38,-8.4756,13.94,1.4,-8.4716,14.32,1.84,-8.3841],
// 4 15 14.75 1.38 -8.4756 14.32 1.84 -8.3841 15.08 2.4 -8.2727 15.4 2.18 -8.3165
  [4,15,14.75,1.38,-8.4756,14.32,1.84,-8.3841,15.08,2.4,-8.2727,15.4,2.18,-8.3165],
// 4 15 15.11 1.02 -8.5472 14.75 1.38 -8.4756 15.4 2.18 -8.3165 15.97 2.41 -8.2707
  [4,15,15.11,1.02,-8.5472,14.75,1.38,-8.4756,15.4,2.18,-8.3165,15.97,2.41,-8.2707],
// 4 15 15.43 .68 -8.6148 15.11 1.02 -8.5472 15.97 2.41 -8.2707 17.9 0 -8.75
  [4,15,15.43,.68,-8.6148,15.11,1.02,-8.5472,15.97,2.41,-8.2707,17.9,0,-8.75],
// 3 15 17.9 0 -8.75 15.97 2.41 -8.2707 17.9 3.349 -8.084
  [3,15,17.9,0,-8.75,15.97,2.41,-8.2707,17.9,3.349,-8.084],
// 3 15 15.97 2.41 -8.2707 15.52 2.75 -8.2031 17.9 3.349 -8.084
  [3,15,15.97,2.41,-8.2707,15.52,2.75,-8.2031,17.9,3.349,-8.084],
// 3 15 15.52 2.75 -8.2031 15.12 2.93 -8.1673 17.9 3.349 -8.084
  [3,15,15.52,2.75,-8.2031,15.12,2.93,-8.1673,17.9,3.349,-8.084],
// 3 15 15.12 2.93 -8.1673 14.47 3.13 -8.1276 17.9 3.349 -8.084
  [3,15,15.12,2.93,-8.1673,14.47,3.13,-8.1276,17.9,3.349,-8.084],
// 3 15 13.51 3.349 -8.084 13.09 3.42 -8.0365 14 5.37 -6.7331
  [3,15,13.51,3.349,-8.084,13.09,3.42,-8.0365,14,5.37,-6.7331],
// 3 15 14.47 3.13 -8.1276 13.51 3.349 -8.084 17.9 3.349 -8.084
  [3,15,14.47,3.13,-8.1276,13.51,3.349,-8.084,17.9,3.349,-8.084],
// 4 15 2.57 -3.349 -8.084 2.57 0 -8.75 17.9 0 -8.75 17.9 -3.349 -8.084
  [4,15,2.57,-3.349,-8.084,2.57,0,-8.75,17.9,0,-8.75,17.9,-3.349,-8.084],
// 3 15 2.8 5.64 -6.5526 2.57 5.84 -6.4189 2.84 5.83 -6.4256
  [3,15,2.8,5.64,-6.5526,2.57,5.84,-6.4189,2.84,5.83,-6.4256],
// 4 15 2.57 3.349 -8.084 2.57 5.84 -6.4189 2.8 5.64 -6.5526 2.9 5.49 -6.6529
  [4,15,2.57,3.349,-8.084,2.57,5.84,-6.4189,2.8,5.64,-6.5526,2.9,5.49,-6.6529],
// 3 15 2.57 3.349 -8.084 2.9 5.49 -6.6529 3.19 5.48 -6.6596
  [3,15,2.57,3.349,-8.084,2.9,5.49,-6.6529,3.19,5.48,-6.6596],
// 3 15 2.57 3.349 -8.084 3.19 5.48 -6.6596 5.19 5.49 -6.6529
  [3,15,2.57,3.349,-8.084,3.19,5.48,-6.6596,5.19,5.49,-6.6529],
// 4 15 14 5.37 -6.7331 11.19 3.58 -7.9296 11.03 3.5 -7.9831 5.19 5.49 -6.6529
  [4,15,14,5.37,-6.7331,11.19,3.58,-7.9296,11.03,3.5,-7.9831,5.19,5.49,-6.6529],
// 4 15 17.9 5.47 -6.6663 17.9 3.349 -8.084 13.51 3.349 -8.084 14 5.37 -6.7331
  [4,15,17.9,5.47,-6.6663,17.9,3.349,-8.084,13.51,3.349,-8.084,14,5.37,-6.7331],
// 3 15 13.09 3.42 -8.0365 11.74 3.6 -7.9162 14 5.37 -6.7331
  [3,15,13.09,3.42,-8.0365,11.74,3.6,-7.9162,14,5.37,-6.7331],
// 3 15 14 5.37 -6.7331 11.74 3.6 -7.9162 11.19 3.58 -7.9296
  [3,15,14,5.37,-6.7331,11.74,3.6,-7.9162,11.19,3.58,-7.9296],
// 3 15 5.19 5.49 -6.6529 11.03 3.5 -7.9831 11 3.42 -8.0365
  [3,15,5.19,5.49,-6.6529,11.03,3.5,-7.9831,11,3.42,-8.0365],
// 4 15 11.03 3.349 -8.084 2.57 3.349 -8.084 5.19 5.49 -6.6529 11 3.42 -8.0365
  [4,15,11.03,3.349,-8.084,2.57,3.349,-8.084,5.19,5.49,-6.6529,11,3.42,-8.0365],
// 3 15 11.03 3.349 -8.084 11.06 3.3 -8.0937 2.57 3.349 -8.084
  [3,15,11.03,3.349,-8.084,11.06,3.3,-8.0937,2.57,3.349,-8.084],
// 4 0 18.1442 6.187 -6.187 17.4 6.3197 -5.9475 17.63 7.33 -4.1245 18.19 7.15 -4.4493
  [4,0,18.1442,6.187,-6.187,17.4,6.3197,-5.9475,17.63,7.33,-4.1245,18.19,7.15,-4.4493],
// 4 0 18.1442 6.187 -6.187 18.12 5.67 -6.5326 17.95 5.61 -6.5727 16.43 5.84 -6.4189
  [4,0,18.1442,6.187,-6.187,18.12,5.67,-6.5326,17.95,5.61,-6.5727,16.43,5.84,-6.4189],
// 3 0 18.1442 6.187 -6.187 16.43 5.84 -6.4189 15.5868 6.187 -6.187
  [3,0,18.1442,6.187,-6.187,16.43,5.84,-6.4189,15.5868,6.187,-6.187],
// 3 0 17.4 6.3197 -5.9475 18.1442 6.187 -6.187 15.5868 6.187 -6.187
  [3,0,17.4,6.3197,-5.9475,18.1442,6.187,-6.187,15.5868,6.187,-6.187],
// 4 0 14.37 6.68 -5.2974 16.17 6.5897 -5.4603 17.4 6.3197 -5.9475 15.5868 6.187 -6.187
  [4,0,14.37,6.68,-5.2974,16.17,6.5897,-5.4603,17.4,6.3197,-5.9475,15.5868,6.187,-6.187],
// 4 0 9.04 6.6576 -5.3378 7.6205 6.187 -6.187 2.5939 6.187 -6.187 3.36 6.38 -5.8387
  [4,0,9.04,6.6576,-5.3378,7.6205,6.187,-6.187,2.5939,6.187,-6.187,3.36,6.38,-5.8387],
// 3 0 2.5939 6.187 -6.187 7.6205 6.187 -6.187 4.45 5.91 -6.3722
  [3,0,2.5939,6.187,-6.187,7.6205,6.187,-6.187,4.45,5.91,-6.3722],
// 3 0 2.5939 6.187 -6.187 3.16 6.51 -5.6042 3.36 6.38 -5.8387
  [3,0,2.5939,6.187,-6.187,3.16,6.51,-5.6042,3.36,6.38,-5.8387],
// 4 0 18.2172 7.399 -4 18.19 7.15 -4.4493 17.63 7.33 -4.1245 17.6188 7.399 -4
  [4,0,18.2172,7.399,-4,18.19,7.15,-4.4493,17.63,7.33,-4.1245,17.6188,7.399,-4],
// 4 0 13.76 6.9476 -4.8145 12.7901 7.399 -4 14.2051 7.399 -4 15.07 6.977 -4.7615
  [4,0,13.76,6.9476,-4.8145,12.7901,7.399,-4,14.2051,7.399,-4,15.07,6.977,-4.7615],
// 4 0 2.1191 7.399 -4 4.7156 7.399 -4 3.28 6.96 -4.7922 2.56 6.96 -4.7922
  [4,0,2.1191,7.399,-4,4.7156,7.399,-4,3.28,6.96,-4.7922,2.56,6.96,-4.7922],
// 3 0 2.7 7.7 -4 4.7156 7.399 -4 2.1191 7.399 -4
  [3,0,2.7,7.7,-4,4.7156,7.399,-4,2.1191,7.399,-4],
// 3 0 2.7 7.7 -4 2.1191 7.399 -4 2.08 7.9 -4
  [3,0,2.7,7.7,-4,2.1191,7.399,-4,2.08,7.9,-4],
// 3 0 2.1191 7.399 -4 2.56 6.96 -4.7922 2.15 7.08 -4.5756
  [3,0,2.1191,7.399,-4,2.56,6.96,-4.7922,2.15,7.08,-4.5756],
// 4 16 18.804 7.399 -4 18.755 6.187 -6.187 18.19 7.15 -4.4493 18.2172 7.399 -4
  [4,16,18.804,7.399,-4,18.755,6.187,-6.187,18.19,7.15,-4.4493,18.2172,7.399,-4],
// 4 16 17.6188 7.399 -4 17.63 7.33 -4.1245 15.07 6.977 -4.7615 14.2051 7.399 -4
  [4,16,17.6188,7.399,-4,17.63,7.33,-4.1245,15.07,6.977,-4.7615,14.2051,7.399,-4],
// 3 16 12.51 6.8876 -4.9228 12.7901 7.399 -4 13.76 6.9476 -4.8145
  [3,16,12.51,6.8876,-4.9228,12.7901,7.399,-4,13.76,6.9476,-4.8145],
// 4 16 4.7156 7.399 -4 12.7901 7.399 -4 12.51 6.8876 -4.9228 9.04 6.6576 -5.3378
  [4,16,4.7156,7.399,-4,12.7901,7.399,-4,12.51,6.8876,-4.9228,9.04,6.6576,-5.3378],
// 3 16 9.04 6.6576 -5.3378 3.28 6.96 -4.7922 4.7156 7.399 -4
  [3,16,9.04,6.6576,-5.3378,3.28,6.96,-4.7922,4.7156,7.399,-4],
// 4 16 2.08 7.9 -4 2.1191 7.399 -4 2 7.399 -4 2 7.657 -4
  [4,16,2.08,7.9,-4,2.1191,7.399,-4,2,7.399,-4,2,7.657,-4],
// 4 16 2.1191 7.399 -4 2.15 7.08 -4.5756 2 6.187 -6.187 2 7.399 -4
  [4,16,2.1191,7.399,-4,2.15,7.08,-4.5756,2,6.187,-6.187,2,7.399,-4],
// 4 16 18.12 5.67 -6.5326 18.1442 6.187 -6.187 18.755 6.187 -6.187 18.659 3.349 -8.084
  [4,16,18.12,5.67,-6.5326,18.1442,6.187,-6.187,18.755,6.187,-6.187,18.659,3.349,-8.084],
// 3 16 18.19 7.15 -4.4493 18.755 6.187 -6.187 18.1442 6.187 -6.187
  [3,16,18.19,7.15,-4.4493,18.755,6.187,-6.187,18.1442,6.187,-6.187],
// 3 16 15.5868 6.187 -6.187 16.43 5.84 -6.4189 16.43 5.81 -6.439
  [3,16,15.5868,6.187,-6.187,16.43,5.84,-6.4189,16.43,5.81,-6.439],
// 4 16 4.45 5.91 -6.3722 7.6205 6.187 -6.187 15.5868 6.187 -6.187 16.43 5.81 -6.439
  [4,16,4.45,5.91,-6.3722,7.6205,6.187,-6.187,15.5868,6.187,-6.187,16.43,5.81,-6.439],
// 4 16 14.37 6.68 -5.2974 15.5868 6.187 -6.187 7.6205 6.187 -6.187 12 6.52 -5.5861
  [4,16,14.37,6.68,-5.2974,15.5868,6.187,-6.187,7.6205,6.187,-6.187,12,6.52,-5.5861],
// 4 16 2.15 7.08 -4.5756 2.56 6.96 -4.7922 2.5939 6.187 -6.187 2 6.187 -6.187
  [4,16,2.15,7.08,-4.5756,2.56,6.96,-4.7922,2.5939,6.187,-6.187,2,6.187,-6.187],
// 3 16 2 6.187 -6.187 2.5939 6.187 -6.187 2.44 6.03 -6.2919
  [3,16,2,6.187,-6.187,2.5939,6.187,-6.187,2.44,6.03,-6.2919],
// 3 16 2.44 6.03 -6.2919 2 3.349 -8.084 2 6.187 -6.187
  [3,16,2.44,6.03,-6.2919,2,3.349,-8.084,2,6.187,-6.187],
];
module ldraw_lib__3817bps0(step=0, col=false, unit=2/5, alt=false, line=0.2, solid=!$preview)
    makepoly(ldraw_lib__3817bps0(), step=step, col=col, unit=unit, alt=alt, line=line, solid=solid);
ldraw_lib__3817bps0(line=0.2);
